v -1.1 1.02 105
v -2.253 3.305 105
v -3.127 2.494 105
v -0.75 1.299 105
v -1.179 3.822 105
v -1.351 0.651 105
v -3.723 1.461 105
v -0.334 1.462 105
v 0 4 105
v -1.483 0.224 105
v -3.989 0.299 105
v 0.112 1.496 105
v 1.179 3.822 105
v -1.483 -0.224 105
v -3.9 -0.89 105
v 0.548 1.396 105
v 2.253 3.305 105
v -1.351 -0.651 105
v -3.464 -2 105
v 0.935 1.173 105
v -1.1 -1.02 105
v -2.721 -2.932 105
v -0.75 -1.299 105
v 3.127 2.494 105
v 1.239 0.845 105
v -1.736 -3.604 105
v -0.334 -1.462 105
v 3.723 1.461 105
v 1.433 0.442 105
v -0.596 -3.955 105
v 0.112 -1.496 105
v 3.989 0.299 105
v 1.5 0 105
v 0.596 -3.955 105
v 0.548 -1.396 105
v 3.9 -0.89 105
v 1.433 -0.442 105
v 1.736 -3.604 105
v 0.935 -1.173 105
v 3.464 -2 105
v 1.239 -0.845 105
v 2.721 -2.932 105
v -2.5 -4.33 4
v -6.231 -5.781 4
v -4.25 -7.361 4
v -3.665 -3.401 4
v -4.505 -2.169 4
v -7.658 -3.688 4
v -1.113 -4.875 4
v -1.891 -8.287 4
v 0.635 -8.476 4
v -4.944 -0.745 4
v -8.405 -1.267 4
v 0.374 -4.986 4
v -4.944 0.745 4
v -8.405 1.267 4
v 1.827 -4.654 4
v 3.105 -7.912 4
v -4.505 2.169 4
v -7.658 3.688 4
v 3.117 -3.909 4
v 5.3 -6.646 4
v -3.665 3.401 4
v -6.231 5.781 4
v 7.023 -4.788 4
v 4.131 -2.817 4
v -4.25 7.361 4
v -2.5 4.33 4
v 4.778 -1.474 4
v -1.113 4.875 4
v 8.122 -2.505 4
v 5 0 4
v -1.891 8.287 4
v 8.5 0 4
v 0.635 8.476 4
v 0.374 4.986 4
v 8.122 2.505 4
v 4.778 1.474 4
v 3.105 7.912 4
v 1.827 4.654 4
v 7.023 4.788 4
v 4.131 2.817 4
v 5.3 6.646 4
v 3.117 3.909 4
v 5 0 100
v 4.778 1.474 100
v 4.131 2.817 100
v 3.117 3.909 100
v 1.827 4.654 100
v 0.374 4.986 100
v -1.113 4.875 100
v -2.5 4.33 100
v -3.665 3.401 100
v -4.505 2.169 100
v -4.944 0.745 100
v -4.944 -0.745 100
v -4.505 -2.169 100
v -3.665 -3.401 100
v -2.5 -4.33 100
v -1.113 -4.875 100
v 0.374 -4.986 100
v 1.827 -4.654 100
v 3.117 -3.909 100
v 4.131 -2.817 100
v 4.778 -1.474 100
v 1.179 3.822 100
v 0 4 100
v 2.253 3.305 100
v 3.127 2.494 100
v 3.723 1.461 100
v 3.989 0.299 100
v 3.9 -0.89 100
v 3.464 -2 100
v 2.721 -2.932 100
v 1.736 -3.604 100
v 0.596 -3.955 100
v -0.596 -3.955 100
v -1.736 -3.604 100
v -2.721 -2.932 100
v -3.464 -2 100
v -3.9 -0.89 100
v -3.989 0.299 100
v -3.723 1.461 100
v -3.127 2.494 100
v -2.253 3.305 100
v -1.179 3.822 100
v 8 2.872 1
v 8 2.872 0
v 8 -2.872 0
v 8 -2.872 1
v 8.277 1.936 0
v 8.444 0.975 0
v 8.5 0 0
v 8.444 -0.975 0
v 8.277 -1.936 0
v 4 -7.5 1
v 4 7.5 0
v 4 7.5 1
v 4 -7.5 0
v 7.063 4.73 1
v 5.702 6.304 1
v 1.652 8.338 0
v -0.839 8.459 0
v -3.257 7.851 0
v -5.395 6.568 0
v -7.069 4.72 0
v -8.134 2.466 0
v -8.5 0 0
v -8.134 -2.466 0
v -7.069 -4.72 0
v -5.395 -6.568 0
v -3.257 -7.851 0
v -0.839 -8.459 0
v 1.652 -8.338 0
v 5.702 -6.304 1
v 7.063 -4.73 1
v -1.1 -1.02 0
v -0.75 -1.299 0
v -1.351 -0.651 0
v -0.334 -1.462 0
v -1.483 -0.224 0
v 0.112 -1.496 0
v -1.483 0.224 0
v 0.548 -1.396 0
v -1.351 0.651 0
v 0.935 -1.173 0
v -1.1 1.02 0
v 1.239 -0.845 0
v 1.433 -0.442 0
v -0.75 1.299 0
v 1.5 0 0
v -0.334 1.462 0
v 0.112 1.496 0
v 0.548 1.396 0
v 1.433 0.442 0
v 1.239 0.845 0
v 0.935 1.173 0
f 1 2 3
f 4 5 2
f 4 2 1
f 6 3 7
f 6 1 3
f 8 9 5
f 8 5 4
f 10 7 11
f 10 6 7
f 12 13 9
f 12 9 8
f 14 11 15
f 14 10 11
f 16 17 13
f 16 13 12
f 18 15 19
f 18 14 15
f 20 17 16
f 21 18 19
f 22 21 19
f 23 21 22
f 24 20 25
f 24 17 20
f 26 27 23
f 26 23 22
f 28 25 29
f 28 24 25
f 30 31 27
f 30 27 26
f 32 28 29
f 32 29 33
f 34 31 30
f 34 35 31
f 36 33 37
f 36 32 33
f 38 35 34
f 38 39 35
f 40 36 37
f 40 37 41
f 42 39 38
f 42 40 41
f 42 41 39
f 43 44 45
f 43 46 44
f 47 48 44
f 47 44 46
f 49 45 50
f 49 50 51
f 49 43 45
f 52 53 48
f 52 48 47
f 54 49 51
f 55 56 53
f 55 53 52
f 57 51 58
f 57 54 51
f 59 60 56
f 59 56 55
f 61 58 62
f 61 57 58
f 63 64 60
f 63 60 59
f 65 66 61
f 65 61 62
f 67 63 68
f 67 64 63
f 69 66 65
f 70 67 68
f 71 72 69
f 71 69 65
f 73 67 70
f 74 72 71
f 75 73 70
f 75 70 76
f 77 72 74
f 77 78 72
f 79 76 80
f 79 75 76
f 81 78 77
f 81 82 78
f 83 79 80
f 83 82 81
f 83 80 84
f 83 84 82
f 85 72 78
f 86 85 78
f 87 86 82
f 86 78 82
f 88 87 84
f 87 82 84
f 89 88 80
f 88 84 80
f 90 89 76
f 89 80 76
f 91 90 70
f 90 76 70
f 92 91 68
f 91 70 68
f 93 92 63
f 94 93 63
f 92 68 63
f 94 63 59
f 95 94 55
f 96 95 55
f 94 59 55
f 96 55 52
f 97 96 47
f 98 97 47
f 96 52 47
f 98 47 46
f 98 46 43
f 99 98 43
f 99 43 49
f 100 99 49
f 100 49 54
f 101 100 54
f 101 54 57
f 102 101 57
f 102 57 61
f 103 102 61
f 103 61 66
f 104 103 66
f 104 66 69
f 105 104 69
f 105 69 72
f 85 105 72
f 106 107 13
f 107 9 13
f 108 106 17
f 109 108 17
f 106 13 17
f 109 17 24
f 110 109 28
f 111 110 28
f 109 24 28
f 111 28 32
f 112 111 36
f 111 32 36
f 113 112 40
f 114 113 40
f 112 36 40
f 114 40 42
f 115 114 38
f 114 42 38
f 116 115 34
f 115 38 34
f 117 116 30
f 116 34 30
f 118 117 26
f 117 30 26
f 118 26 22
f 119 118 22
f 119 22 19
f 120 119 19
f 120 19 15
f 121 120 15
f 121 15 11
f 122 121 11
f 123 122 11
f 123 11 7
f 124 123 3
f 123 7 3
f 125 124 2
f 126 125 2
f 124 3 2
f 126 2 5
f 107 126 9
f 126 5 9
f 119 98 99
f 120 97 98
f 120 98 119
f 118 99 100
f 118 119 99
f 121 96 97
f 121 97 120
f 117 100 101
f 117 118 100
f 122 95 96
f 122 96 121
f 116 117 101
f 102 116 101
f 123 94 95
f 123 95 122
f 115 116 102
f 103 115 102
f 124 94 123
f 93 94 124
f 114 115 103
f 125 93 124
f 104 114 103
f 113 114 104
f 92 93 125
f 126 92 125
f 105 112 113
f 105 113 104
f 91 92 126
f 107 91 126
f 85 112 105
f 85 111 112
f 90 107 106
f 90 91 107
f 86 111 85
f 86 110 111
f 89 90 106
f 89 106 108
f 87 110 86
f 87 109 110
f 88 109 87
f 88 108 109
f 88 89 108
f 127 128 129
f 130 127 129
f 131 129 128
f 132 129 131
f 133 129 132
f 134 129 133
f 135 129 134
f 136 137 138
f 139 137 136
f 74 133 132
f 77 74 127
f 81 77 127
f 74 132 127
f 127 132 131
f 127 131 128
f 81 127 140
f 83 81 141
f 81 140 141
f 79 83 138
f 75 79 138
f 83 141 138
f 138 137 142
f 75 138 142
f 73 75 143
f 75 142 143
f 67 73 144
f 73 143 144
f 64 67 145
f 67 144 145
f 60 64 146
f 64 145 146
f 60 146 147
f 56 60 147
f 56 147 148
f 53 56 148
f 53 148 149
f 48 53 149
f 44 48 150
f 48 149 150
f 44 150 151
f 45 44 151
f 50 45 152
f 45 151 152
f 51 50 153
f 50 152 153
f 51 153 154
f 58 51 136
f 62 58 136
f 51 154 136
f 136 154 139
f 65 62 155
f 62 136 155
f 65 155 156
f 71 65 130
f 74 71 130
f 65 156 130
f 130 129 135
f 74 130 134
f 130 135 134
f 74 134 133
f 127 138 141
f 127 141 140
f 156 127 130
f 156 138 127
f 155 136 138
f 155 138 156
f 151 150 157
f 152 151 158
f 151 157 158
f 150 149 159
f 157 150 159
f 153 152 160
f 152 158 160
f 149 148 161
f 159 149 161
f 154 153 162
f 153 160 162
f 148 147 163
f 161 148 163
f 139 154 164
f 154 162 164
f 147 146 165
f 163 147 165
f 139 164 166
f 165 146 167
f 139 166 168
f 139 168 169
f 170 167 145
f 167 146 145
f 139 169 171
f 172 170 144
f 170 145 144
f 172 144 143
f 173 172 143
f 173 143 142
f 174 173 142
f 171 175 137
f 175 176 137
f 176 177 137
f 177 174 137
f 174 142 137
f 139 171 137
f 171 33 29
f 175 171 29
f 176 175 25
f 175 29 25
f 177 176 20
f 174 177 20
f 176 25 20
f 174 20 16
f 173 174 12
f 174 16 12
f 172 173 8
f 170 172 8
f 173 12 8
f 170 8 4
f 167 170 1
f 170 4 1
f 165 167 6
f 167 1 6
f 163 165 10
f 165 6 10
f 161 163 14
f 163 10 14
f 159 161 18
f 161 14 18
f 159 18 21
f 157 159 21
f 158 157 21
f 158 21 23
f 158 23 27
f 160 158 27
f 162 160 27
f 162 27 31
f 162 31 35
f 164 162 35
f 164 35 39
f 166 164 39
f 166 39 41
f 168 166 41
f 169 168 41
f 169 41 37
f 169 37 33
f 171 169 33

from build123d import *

# Parameters (mm, degrees)
F0_R     = 8.5
F1_DEPTH = 4
F2_R     = 5
F3_DEPTH = 100
F4_W     = 4
F4_H     = 5
F6_W     = 4
F6_H     = 36.891641
F7_DEPTH = 1
F8_R     = 1.5
F9_DEPTH = 122


with BuildPart() as f1:
    # F0 (on Top) → F1 (new body)
    with BuildSketch(Plane.XY):
        Circle(F0_R)
    extrude(amount=F1_DEPTH)

    # F2 (on Top) → F3 (join)
    with BuildSketch(Plane.XY):
        Circle(F2_R)
    extrude(amount=F3_DEPTH)

    # F4 (on Right) → F5 (revolve)
    with BuildSketch(Plane.YZ):
        with Locations((2, 102.5)):
            Rectangle(F4_W, F4_H)
    revolve(axis=Axis((0, 0, 102.5), (0, 0, -1)))

    # F6 (on face) → F7 (cut)
    with BuildSketch(Plane(origin=(0, 0, 0), x_dir=(1, 0, 0), z_dir=(0, 0, -1))):
        with Locations((6, -0.745802)):
            Rectangle(F6_W, F6_H)
    extrude(amount=-F7_DEPTH, mode=Mode.SUBTRACT)

    # F8 (on face) → F9 (cut)
    with BuildSketch(Plane.XY.offset(105)):
        Circle(F8_R)
    extrude(amount=-F9_DEPTH, mode=Mode.SUBTRACT)


solid = f1.part
